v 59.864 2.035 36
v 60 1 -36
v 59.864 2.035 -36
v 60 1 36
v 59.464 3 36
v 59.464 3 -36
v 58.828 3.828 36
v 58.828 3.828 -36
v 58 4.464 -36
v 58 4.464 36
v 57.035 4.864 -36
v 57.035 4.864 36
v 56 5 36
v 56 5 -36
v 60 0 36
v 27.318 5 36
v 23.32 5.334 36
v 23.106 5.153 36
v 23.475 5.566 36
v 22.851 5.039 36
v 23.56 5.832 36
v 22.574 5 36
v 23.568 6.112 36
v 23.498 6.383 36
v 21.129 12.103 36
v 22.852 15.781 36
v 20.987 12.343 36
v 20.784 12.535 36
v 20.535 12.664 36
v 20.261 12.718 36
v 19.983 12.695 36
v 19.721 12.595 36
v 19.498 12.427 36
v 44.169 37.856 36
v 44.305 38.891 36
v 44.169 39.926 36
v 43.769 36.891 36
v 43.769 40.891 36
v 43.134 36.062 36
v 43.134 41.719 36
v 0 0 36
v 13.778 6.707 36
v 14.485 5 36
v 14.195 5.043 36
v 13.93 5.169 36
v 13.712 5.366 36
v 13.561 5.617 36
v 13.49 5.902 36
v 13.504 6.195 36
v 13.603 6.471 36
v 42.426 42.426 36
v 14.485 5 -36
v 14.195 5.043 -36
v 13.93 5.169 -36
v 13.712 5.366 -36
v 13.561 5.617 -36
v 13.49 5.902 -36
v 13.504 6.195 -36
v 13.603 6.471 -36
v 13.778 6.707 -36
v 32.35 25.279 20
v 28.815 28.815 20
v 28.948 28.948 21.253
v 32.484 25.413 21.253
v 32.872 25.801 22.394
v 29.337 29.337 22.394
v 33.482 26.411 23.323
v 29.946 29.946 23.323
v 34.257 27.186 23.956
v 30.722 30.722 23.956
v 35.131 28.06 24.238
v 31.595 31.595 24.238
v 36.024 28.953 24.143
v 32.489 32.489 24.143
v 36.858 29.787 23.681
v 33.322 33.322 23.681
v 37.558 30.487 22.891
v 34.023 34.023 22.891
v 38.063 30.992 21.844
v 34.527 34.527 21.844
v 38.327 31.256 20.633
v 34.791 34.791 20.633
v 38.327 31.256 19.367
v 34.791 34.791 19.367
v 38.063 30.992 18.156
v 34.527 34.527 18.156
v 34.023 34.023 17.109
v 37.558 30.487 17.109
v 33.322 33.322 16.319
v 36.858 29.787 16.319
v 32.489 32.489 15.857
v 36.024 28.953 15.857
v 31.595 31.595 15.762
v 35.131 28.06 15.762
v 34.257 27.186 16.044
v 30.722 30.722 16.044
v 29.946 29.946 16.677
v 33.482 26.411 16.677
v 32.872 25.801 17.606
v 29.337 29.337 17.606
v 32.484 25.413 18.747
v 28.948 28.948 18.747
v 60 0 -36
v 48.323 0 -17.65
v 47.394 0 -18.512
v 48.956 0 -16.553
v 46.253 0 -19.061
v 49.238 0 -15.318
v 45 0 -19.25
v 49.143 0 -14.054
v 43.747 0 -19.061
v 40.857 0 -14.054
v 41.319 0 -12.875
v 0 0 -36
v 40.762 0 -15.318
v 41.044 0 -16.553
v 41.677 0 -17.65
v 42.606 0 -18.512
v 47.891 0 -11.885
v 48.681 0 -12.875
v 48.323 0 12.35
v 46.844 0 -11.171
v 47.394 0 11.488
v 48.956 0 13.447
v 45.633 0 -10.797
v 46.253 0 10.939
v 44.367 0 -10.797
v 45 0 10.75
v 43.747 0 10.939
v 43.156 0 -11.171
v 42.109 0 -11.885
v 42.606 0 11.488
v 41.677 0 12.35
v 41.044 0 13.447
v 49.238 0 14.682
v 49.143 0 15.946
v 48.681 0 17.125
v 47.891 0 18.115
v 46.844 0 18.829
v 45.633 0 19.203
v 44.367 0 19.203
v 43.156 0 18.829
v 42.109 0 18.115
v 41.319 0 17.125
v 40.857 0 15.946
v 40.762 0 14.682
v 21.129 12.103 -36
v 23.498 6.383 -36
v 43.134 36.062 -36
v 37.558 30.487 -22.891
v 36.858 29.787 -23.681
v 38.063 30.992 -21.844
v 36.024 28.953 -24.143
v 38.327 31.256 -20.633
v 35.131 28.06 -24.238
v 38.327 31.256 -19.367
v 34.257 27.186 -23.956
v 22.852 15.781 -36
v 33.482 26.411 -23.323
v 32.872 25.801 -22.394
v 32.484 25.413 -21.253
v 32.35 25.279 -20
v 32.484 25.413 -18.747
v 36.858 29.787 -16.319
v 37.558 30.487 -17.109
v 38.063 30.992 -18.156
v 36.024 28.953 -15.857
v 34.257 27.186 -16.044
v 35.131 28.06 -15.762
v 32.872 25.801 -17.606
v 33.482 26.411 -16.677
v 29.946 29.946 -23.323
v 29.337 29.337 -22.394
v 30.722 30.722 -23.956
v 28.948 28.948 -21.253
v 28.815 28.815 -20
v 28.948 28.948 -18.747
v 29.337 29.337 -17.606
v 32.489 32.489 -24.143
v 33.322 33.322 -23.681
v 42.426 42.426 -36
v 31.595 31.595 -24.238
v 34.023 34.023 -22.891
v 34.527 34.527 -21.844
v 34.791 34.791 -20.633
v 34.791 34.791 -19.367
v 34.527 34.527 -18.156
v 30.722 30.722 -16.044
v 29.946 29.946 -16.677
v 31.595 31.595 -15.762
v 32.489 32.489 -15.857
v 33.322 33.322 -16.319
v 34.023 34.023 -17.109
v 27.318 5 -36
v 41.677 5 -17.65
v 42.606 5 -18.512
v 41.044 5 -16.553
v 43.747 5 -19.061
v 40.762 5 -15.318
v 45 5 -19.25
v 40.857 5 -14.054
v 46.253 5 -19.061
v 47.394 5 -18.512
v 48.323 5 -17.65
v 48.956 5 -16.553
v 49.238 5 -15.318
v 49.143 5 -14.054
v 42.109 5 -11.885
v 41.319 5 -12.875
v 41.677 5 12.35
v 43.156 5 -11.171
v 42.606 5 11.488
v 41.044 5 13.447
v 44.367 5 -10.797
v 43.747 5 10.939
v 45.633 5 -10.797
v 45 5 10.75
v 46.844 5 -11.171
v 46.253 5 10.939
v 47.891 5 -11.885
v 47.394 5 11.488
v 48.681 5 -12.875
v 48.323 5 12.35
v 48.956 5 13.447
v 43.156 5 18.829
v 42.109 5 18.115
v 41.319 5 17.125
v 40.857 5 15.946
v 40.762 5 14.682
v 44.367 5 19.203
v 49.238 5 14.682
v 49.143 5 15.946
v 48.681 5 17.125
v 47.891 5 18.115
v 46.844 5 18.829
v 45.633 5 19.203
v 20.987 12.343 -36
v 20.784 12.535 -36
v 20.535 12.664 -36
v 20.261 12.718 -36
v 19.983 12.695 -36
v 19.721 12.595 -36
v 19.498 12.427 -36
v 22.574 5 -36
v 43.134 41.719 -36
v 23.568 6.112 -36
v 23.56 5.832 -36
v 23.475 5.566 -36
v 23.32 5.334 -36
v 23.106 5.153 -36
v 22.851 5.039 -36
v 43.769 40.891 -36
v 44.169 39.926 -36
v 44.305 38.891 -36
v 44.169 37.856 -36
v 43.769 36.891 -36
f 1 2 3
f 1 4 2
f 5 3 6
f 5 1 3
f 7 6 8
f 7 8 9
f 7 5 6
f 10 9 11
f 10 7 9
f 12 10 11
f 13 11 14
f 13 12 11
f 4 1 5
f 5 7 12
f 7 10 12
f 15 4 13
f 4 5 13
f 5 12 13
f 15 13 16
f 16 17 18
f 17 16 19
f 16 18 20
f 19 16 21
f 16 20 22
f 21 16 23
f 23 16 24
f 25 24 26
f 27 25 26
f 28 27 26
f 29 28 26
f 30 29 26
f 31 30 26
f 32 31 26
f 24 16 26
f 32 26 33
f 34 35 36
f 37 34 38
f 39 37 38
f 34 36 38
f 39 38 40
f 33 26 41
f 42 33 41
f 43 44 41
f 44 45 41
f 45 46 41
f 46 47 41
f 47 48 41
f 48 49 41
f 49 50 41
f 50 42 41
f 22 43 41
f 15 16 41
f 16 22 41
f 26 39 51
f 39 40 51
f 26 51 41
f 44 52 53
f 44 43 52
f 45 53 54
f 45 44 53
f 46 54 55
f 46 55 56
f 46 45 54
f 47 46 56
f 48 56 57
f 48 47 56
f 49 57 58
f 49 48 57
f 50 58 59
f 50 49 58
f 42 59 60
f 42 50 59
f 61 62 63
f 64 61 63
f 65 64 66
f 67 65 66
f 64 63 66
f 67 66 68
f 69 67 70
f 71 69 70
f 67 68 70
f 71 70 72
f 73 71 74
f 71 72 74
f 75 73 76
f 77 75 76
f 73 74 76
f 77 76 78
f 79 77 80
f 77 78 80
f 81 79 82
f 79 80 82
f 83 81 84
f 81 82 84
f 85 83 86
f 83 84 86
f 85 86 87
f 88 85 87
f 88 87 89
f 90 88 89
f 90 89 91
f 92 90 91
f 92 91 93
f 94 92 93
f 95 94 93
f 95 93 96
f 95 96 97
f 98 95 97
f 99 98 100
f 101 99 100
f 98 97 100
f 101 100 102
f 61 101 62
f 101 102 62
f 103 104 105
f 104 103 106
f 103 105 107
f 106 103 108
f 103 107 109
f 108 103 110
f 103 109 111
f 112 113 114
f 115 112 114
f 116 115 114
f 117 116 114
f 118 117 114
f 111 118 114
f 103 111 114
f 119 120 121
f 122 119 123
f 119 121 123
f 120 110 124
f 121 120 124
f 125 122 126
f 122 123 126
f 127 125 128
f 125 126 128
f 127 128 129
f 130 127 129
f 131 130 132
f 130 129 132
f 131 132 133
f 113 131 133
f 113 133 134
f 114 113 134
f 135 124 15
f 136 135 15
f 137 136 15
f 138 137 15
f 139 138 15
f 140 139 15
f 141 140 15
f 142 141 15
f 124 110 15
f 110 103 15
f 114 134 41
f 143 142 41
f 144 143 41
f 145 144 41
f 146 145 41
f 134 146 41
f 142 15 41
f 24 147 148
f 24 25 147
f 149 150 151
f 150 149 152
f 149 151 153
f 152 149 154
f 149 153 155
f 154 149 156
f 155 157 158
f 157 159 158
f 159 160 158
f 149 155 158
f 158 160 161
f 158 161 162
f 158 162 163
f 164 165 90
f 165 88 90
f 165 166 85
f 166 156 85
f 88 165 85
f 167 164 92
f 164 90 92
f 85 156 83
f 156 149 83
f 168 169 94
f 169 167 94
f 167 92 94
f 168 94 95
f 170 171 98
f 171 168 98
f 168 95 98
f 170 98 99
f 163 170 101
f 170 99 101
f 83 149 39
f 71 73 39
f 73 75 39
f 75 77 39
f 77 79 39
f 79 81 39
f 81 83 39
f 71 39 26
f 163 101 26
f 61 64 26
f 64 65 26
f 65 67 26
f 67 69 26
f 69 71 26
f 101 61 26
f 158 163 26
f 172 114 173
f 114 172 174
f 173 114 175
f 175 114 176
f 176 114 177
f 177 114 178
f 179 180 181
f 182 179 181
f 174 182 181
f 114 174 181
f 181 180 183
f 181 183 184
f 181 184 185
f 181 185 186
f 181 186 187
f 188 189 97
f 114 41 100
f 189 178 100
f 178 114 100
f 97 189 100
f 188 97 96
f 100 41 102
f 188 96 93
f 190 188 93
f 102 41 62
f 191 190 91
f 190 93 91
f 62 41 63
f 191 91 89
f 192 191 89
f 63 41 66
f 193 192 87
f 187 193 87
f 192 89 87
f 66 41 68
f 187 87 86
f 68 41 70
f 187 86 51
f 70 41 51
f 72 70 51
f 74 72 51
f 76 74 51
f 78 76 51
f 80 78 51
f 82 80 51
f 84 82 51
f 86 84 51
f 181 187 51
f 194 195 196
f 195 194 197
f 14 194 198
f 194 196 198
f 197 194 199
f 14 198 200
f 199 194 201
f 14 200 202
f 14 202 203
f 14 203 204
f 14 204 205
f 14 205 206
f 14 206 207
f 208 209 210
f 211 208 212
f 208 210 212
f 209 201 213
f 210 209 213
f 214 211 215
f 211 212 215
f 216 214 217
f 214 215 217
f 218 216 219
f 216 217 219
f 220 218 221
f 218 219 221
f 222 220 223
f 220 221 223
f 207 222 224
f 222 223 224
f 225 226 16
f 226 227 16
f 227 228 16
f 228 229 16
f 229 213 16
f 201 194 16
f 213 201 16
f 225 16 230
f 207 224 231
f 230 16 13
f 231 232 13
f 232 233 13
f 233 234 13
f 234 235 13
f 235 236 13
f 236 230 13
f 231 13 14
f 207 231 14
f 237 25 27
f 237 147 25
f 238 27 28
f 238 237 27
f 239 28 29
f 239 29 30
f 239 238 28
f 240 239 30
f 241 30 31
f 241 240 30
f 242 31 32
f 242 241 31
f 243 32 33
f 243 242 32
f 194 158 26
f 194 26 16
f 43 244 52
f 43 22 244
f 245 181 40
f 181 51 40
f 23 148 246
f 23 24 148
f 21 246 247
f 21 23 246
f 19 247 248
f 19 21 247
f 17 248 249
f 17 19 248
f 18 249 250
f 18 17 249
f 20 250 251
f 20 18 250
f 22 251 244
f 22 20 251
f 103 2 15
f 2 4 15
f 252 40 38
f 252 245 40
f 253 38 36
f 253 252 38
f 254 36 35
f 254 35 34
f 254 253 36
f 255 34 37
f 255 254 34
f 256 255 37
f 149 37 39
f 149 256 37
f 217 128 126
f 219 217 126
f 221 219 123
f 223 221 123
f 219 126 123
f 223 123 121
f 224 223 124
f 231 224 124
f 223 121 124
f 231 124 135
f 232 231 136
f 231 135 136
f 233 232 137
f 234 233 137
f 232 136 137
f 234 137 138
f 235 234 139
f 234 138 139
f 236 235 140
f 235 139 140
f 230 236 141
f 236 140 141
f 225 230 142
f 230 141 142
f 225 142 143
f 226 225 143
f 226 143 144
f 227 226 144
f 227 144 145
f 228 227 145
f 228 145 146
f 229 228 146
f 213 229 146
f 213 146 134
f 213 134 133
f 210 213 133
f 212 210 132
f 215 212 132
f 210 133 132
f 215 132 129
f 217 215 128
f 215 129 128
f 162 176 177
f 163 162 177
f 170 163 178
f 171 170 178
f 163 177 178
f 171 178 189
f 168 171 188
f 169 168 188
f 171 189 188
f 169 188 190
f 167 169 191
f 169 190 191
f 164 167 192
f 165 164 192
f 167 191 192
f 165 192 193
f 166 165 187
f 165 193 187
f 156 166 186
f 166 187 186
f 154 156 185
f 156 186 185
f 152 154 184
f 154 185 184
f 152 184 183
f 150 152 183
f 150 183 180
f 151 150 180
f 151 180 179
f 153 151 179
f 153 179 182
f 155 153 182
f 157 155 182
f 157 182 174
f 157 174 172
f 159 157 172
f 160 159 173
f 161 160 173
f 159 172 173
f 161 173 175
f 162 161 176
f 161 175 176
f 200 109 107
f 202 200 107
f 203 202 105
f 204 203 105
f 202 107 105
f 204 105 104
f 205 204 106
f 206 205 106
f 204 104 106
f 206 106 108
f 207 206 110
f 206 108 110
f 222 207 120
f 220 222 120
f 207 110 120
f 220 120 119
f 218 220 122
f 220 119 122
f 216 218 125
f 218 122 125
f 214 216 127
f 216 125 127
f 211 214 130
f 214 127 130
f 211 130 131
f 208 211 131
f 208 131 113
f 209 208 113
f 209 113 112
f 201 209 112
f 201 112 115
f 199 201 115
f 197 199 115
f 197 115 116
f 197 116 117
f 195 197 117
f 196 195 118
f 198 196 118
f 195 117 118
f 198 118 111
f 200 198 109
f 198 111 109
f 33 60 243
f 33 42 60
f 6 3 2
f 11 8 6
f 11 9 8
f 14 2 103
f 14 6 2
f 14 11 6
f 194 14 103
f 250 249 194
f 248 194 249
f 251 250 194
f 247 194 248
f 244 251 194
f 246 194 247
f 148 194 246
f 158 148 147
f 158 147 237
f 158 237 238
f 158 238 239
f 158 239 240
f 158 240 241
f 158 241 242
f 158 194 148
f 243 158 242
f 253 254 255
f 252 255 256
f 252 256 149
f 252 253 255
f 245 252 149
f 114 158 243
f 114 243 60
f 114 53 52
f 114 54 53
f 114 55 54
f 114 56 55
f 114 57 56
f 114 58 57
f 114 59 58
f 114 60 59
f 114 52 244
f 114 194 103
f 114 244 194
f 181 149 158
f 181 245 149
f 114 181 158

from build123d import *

# Parameters (mm, degrees)
EXTRUDE_1_DEPTH     = 36
SKETCH_2_R          = 4.25
CUT_EXTRUDE_1_DEPTH = 5
SKETCH_3_R          = 4.25
CUT_EXTRUDE_2_DEPTH = 5
FILLET_1_R          = 4
FILLET_2_R          = 1


with BuildPart() as part:
    # Эскиз1 → Бобышка-Вытянуть1 (new body, symmetric)
    with BuildSketch(Plane.XY):
        Polygon((0, 0), (42.426406871, 42.426406871), (45.961940777, 38.890872965), (22.85244978, 15.781381968), (27.318244413, 5), (60, 5), (60, 0), align=None)
        Polygon((20.556349186, 13.485281374), (24.071067812, 5), (12.071067812, 5), align=None, mode=Mode.SUBTRACT)
    extrude(amount=EXTRUDE_1_DEPTH, both=True)

    # Эскиз2 → Вырез-Вытянуть1 (cut)
    with BuildSketch(Plane(origin=(0, 0, 0), x_dir=(0, 0, 1), z_dir=(-0.707106781, 0.707106781, 0))):
        with Locations(Location((-20, 45, 0), (0, 0, 270))):  # turned: the seam where the file's is
            Circle(SKETCH_2_R)
        with Locations(Location((20, 45, 0), (0, 0, 270))):  # turned: the seam where the file's is
            Circle(SKETCH_2_R)
    extrude(amount=-CUT_EXTRUDE_1_DEPTH, mode=Mode.SUBTRACT)

    # Эскиз3 → Вырез-Вытянуть2 (cut)
    with BuildSketch(Plane.XZ):
        with Locations(Location((45, 15, 0), (0, 0, 270))):  # turned: the seam where the file's is
            Circle(SKETCH_3_R)
        with Locations(Location((45, -15, 0), (0, 0, 270))):  # turned: the seam where the file's is
            Circle(SKETCH_3_R)
    extrude(amount=-CUT_EXTRUDE_2_DEPTH, mode=Mode.SUBTRACT)

    # Скругление1
    fillet_1_edges = [part.edges().sort_by_distance(p)[0] for p in [
        (45.961940777, 38.890872965, 0),
        (60, 5, 0),
    ]]
    fillet(fillet_1_edges, radius=FILLET_1_R)

    # Скругление2
    fillet_2_edges = [part.edges().sort_by_distance(p)[0] for p in [
        (20.556349186, 13.485281374, 0),
        (12.071067812, 5, 0),
        (24.071067812, 5, 0),
    ]]
    fillet(fillet_2_edges, radius=FILLET_2_R)


solid = part.part
